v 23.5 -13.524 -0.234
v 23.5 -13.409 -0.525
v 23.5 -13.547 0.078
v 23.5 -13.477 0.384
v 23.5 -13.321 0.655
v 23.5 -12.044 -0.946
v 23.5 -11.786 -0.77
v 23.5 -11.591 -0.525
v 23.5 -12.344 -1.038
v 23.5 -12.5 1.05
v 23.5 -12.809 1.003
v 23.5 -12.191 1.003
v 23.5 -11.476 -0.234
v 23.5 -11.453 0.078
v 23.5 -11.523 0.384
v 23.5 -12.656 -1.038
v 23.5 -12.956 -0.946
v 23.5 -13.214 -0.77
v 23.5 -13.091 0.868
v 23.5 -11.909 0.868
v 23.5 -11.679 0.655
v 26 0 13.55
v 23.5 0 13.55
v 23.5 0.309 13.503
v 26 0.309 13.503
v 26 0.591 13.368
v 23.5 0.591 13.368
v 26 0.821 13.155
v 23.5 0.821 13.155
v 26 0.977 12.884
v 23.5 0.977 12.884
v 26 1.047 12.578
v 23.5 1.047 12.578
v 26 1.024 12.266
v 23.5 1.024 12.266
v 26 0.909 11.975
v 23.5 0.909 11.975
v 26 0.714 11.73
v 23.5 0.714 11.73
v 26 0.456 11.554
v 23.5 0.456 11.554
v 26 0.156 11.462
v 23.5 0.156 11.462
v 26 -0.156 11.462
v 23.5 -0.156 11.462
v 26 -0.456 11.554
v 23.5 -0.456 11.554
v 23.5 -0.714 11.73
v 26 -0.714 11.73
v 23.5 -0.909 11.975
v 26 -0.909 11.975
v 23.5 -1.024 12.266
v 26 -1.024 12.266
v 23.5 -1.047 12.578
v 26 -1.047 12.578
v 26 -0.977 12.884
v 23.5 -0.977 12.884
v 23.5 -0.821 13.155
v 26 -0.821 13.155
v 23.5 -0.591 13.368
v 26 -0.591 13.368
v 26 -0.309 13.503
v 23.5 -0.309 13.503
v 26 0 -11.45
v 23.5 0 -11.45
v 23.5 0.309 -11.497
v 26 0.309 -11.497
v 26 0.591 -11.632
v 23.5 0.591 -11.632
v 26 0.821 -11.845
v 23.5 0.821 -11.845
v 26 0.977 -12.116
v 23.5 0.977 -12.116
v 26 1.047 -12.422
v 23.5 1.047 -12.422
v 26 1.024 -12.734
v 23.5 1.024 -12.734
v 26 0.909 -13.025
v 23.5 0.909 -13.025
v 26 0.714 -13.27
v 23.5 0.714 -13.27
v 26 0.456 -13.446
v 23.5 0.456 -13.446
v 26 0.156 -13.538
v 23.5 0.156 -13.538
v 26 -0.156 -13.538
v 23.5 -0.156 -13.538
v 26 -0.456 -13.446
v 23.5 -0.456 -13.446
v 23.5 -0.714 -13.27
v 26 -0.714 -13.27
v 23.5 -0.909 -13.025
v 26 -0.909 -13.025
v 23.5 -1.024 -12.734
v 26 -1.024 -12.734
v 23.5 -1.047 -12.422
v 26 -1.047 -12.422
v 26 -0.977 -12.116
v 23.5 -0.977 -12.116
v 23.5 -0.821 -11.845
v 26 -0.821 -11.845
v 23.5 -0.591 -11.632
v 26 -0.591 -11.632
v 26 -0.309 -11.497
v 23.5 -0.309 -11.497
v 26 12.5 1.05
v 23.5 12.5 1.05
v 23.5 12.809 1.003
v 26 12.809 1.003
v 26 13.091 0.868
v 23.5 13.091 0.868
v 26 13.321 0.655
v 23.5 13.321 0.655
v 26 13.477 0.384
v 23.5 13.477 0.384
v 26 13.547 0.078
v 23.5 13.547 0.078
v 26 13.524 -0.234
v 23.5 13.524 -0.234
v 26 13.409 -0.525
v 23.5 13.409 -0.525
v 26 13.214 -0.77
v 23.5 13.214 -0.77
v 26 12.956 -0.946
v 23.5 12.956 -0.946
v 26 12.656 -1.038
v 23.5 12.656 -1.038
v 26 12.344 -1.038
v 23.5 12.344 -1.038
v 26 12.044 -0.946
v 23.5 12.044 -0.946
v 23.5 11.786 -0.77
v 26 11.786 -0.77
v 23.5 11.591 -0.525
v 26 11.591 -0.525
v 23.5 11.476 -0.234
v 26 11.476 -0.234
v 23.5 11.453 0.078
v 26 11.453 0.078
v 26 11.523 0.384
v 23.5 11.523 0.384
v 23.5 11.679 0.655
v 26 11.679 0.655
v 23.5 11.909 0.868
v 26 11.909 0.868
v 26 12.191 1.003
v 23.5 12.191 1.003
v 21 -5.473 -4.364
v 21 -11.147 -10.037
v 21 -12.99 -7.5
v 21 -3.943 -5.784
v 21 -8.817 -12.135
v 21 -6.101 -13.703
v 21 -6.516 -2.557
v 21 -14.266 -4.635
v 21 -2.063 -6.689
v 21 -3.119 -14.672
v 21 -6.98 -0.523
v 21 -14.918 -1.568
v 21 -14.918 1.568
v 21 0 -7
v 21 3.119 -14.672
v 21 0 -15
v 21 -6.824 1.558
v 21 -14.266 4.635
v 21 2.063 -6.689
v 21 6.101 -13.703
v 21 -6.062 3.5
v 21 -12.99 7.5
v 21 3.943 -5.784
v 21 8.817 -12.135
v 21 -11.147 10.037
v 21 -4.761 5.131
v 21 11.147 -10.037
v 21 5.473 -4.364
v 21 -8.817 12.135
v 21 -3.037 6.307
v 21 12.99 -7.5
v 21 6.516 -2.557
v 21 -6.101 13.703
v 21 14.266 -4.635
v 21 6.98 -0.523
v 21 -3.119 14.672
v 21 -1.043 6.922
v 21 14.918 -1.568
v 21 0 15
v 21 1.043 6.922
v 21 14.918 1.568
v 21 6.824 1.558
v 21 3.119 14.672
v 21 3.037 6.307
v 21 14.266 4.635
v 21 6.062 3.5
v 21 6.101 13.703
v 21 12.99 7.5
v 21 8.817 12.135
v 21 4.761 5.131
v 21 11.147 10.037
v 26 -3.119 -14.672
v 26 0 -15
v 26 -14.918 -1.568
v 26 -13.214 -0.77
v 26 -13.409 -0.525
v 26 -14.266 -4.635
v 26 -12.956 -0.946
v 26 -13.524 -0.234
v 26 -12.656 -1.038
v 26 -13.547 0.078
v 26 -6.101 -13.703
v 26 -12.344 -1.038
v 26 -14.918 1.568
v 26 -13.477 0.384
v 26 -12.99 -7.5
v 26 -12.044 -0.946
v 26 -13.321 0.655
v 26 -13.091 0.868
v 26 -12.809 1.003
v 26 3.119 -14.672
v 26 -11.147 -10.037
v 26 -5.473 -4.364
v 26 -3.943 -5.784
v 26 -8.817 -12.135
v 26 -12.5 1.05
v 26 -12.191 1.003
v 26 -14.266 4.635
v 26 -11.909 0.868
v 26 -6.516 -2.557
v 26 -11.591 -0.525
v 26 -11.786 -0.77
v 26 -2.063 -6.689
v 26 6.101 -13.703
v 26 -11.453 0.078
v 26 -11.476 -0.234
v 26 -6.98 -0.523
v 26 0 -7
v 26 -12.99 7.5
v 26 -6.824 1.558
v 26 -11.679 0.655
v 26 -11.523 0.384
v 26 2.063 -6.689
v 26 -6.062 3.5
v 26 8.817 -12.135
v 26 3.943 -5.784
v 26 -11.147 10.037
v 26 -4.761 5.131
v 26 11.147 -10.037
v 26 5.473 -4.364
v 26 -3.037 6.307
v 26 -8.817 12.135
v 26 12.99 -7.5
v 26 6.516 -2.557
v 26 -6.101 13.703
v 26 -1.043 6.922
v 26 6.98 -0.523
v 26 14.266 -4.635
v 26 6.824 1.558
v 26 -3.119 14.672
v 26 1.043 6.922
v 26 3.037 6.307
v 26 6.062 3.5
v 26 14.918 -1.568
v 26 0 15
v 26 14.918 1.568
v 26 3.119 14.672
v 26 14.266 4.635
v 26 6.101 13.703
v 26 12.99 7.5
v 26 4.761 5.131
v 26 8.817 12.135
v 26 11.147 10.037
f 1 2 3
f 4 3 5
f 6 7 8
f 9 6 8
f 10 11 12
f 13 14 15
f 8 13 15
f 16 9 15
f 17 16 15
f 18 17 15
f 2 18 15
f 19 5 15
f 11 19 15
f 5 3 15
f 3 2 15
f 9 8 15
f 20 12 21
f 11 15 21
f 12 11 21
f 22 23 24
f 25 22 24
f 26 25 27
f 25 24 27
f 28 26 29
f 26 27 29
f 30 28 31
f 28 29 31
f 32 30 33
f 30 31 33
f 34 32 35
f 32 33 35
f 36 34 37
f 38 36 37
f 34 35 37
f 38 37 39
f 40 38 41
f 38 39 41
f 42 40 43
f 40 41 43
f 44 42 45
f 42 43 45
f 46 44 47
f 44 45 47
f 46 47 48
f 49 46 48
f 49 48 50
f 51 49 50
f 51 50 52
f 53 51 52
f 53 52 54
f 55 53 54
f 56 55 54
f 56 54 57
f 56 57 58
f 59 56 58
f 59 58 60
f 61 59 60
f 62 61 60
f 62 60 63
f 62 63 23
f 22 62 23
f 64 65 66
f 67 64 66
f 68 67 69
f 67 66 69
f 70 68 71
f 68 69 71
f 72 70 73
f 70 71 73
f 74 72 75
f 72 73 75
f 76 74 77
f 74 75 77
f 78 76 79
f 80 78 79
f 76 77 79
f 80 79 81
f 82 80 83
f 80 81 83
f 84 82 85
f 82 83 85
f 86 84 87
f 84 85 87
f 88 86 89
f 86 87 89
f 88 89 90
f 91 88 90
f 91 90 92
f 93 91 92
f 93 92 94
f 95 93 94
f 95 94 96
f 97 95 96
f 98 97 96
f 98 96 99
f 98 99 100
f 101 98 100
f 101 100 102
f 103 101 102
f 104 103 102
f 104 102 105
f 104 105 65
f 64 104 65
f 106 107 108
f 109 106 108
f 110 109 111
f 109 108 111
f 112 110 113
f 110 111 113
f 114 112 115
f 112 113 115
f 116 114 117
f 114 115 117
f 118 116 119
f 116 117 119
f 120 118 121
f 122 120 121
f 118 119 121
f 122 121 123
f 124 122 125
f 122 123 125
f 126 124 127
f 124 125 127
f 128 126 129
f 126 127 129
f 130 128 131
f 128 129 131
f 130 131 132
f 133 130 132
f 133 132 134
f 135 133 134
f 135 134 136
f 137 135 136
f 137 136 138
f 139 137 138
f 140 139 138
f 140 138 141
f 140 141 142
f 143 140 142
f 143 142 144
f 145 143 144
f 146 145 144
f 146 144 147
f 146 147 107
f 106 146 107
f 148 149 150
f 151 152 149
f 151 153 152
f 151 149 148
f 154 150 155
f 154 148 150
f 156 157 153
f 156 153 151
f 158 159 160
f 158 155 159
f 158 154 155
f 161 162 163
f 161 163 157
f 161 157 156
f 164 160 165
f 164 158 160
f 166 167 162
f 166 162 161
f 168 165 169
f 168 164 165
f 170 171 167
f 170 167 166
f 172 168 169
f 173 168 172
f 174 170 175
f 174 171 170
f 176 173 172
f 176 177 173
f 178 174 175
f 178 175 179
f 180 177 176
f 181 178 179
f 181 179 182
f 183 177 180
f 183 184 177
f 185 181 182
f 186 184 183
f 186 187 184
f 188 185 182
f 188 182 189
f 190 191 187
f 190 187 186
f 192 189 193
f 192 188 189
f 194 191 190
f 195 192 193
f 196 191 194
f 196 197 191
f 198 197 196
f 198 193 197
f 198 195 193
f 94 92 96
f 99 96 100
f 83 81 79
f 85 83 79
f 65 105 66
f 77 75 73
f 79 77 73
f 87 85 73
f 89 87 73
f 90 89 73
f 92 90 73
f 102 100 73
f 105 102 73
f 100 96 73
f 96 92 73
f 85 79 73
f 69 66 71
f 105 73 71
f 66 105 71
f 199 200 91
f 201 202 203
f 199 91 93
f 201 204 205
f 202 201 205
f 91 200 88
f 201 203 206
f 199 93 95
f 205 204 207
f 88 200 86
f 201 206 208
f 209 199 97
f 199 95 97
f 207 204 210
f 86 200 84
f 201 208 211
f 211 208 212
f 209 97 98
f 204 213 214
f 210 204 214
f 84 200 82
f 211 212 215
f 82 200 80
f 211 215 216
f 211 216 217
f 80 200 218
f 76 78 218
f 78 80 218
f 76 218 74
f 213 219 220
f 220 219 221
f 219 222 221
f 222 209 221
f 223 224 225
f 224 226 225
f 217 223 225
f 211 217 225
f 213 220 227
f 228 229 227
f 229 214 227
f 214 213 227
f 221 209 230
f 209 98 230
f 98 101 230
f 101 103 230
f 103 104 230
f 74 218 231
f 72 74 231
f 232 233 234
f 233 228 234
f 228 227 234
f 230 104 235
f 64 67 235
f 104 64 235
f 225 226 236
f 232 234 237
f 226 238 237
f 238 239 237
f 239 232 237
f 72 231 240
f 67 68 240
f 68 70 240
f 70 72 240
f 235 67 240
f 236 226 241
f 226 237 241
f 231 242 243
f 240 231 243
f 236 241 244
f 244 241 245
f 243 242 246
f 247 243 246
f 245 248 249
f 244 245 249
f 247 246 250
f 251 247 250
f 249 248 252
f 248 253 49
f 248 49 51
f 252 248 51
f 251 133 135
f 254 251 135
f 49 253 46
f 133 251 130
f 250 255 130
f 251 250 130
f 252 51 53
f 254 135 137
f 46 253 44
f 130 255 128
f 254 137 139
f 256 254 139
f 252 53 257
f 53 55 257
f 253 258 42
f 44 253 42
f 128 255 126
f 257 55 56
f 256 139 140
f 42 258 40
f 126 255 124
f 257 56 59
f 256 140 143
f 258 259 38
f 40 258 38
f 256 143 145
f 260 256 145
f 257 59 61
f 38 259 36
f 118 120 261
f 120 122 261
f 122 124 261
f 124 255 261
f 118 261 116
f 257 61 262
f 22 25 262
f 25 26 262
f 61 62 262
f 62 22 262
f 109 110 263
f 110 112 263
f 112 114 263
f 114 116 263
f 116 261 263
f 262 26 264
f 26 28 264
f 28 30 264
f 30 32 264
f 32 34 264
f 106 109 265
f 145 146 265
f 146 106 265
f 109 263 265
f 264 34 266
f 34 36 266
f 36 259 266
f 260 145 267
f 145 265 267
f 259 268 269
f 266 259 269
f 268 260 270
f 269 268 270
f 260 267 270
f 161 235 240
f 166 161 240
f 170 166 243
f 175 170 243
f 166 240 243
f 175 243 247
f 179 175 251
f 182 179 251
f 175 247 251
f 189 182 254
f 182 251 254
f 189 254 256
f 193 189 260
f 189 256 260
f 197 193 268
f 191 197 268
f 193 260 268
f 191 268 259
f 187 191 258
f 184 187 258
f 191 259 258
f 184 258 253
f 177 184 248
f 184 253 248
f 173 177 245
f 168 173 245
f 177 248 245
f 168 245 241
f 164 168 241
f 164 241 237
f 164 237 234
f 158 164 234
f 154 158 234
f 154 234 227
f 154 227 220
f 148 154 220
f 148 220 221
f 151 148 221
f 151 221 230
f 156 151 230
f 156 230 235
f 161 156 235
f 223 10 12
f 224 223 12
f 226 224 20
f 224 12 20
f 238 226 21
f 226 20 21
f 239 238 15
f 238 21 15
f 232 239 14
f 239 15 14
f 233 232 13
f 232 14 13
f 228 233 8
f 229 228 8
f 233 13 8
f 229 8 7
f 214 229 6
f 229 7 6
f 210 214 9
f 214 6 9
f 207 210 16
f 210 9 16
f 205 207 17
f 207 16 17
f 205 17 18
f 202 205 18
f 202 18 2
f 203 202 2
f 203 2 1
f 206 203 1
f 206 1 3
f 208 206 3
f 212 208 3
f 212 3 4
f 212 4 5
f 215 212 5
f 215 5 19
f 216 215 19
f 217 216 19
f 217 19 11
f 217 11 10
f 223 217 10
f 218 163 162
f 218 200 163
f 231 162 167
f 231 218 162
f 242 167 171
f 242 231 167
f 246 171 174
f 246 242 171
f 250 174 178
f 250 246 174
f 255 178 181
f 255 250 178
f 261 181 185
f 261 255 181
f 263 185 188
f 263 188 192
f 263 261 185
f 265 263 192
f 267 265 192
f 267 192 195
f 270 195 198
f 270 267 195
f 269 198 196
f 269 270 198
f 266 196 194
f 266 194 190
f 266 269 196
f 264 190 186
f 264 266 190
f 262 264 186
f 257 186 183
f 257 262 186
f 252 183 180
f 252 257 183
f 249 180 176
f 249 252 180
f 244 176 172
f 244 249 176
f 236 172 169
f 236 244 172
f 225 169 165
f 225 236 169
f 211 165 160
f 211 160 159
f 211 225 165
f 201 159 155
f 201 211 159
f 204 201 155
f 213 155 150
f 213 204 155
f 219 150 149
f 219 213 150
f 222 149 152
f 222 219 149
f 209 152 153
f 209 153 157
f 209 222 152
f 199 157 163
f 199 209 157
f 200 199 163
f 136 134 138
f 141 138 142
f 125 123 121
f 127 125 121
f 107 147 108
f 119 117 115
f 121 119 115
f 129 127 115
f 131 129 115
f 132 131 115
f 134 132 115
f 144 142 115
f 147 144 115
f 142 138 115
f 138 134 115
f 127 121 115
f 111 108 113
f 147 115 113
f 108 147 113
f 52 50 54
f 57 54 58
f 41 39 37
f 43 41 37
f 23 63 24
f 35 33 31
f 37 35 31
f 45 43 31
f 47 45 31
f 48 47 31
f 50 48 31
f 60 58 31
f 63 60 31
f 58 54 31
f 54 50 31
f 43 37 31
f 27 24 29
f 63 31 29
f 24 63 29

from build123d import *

# Parameters (mm, degrees)
SKETCH1_W                      = 5
SKETCH1_H                      = 15
F_14_0_14_DIAMETER_HOLE1_D     = 14
F_2_1_2_1_DIAMETER_HOLE1_D     = 2.1
F_2_1_2_1_DIAMETER_HOLE1_DEPTH = 2.5


with BuildPart() as part:
    # Sketch1 → Revolve1 (revolve)
    with BuildSketch(Plane.XY, mode=Mode.PRIVATE) as revolve1_sk:
        with Locations((23.5, 7.5)):
            Rectangle(SKETCH1_W, SKETCH1_H)
    revolve(revolve1_sk.sketch.rotate(Axis((21, 0, 0), (1, 0, 0)), 270), axis=Axis((21, 0, 0), (1, 0, 0)))

    # Ø14.0 (14) Diameter Hole1 (through all)
    with Locations(Plane.ZY.offset(-21)):
        with Locations((0, 0)):
            Hole(F_14_0_14_DIAMETER_HOLE1_D / 2)

    # Ø2.1 (2.1) Diameter Hole1
    with Locations(Plane(origin=(26, 0, 0), x_dir=(0, 0, -1), z_dir=(1, 0, 0))):
        with Locations((-12.5, 0), (12.5, 0), (0, -12.5), (0, 12.5)):
            Hole(F_2_1_2_1_DIAMETER_HOLE1_D / 2, depth=F_2_1_2_1_DIAMETER_HOLE1_DEPTH)


solid = part.part
